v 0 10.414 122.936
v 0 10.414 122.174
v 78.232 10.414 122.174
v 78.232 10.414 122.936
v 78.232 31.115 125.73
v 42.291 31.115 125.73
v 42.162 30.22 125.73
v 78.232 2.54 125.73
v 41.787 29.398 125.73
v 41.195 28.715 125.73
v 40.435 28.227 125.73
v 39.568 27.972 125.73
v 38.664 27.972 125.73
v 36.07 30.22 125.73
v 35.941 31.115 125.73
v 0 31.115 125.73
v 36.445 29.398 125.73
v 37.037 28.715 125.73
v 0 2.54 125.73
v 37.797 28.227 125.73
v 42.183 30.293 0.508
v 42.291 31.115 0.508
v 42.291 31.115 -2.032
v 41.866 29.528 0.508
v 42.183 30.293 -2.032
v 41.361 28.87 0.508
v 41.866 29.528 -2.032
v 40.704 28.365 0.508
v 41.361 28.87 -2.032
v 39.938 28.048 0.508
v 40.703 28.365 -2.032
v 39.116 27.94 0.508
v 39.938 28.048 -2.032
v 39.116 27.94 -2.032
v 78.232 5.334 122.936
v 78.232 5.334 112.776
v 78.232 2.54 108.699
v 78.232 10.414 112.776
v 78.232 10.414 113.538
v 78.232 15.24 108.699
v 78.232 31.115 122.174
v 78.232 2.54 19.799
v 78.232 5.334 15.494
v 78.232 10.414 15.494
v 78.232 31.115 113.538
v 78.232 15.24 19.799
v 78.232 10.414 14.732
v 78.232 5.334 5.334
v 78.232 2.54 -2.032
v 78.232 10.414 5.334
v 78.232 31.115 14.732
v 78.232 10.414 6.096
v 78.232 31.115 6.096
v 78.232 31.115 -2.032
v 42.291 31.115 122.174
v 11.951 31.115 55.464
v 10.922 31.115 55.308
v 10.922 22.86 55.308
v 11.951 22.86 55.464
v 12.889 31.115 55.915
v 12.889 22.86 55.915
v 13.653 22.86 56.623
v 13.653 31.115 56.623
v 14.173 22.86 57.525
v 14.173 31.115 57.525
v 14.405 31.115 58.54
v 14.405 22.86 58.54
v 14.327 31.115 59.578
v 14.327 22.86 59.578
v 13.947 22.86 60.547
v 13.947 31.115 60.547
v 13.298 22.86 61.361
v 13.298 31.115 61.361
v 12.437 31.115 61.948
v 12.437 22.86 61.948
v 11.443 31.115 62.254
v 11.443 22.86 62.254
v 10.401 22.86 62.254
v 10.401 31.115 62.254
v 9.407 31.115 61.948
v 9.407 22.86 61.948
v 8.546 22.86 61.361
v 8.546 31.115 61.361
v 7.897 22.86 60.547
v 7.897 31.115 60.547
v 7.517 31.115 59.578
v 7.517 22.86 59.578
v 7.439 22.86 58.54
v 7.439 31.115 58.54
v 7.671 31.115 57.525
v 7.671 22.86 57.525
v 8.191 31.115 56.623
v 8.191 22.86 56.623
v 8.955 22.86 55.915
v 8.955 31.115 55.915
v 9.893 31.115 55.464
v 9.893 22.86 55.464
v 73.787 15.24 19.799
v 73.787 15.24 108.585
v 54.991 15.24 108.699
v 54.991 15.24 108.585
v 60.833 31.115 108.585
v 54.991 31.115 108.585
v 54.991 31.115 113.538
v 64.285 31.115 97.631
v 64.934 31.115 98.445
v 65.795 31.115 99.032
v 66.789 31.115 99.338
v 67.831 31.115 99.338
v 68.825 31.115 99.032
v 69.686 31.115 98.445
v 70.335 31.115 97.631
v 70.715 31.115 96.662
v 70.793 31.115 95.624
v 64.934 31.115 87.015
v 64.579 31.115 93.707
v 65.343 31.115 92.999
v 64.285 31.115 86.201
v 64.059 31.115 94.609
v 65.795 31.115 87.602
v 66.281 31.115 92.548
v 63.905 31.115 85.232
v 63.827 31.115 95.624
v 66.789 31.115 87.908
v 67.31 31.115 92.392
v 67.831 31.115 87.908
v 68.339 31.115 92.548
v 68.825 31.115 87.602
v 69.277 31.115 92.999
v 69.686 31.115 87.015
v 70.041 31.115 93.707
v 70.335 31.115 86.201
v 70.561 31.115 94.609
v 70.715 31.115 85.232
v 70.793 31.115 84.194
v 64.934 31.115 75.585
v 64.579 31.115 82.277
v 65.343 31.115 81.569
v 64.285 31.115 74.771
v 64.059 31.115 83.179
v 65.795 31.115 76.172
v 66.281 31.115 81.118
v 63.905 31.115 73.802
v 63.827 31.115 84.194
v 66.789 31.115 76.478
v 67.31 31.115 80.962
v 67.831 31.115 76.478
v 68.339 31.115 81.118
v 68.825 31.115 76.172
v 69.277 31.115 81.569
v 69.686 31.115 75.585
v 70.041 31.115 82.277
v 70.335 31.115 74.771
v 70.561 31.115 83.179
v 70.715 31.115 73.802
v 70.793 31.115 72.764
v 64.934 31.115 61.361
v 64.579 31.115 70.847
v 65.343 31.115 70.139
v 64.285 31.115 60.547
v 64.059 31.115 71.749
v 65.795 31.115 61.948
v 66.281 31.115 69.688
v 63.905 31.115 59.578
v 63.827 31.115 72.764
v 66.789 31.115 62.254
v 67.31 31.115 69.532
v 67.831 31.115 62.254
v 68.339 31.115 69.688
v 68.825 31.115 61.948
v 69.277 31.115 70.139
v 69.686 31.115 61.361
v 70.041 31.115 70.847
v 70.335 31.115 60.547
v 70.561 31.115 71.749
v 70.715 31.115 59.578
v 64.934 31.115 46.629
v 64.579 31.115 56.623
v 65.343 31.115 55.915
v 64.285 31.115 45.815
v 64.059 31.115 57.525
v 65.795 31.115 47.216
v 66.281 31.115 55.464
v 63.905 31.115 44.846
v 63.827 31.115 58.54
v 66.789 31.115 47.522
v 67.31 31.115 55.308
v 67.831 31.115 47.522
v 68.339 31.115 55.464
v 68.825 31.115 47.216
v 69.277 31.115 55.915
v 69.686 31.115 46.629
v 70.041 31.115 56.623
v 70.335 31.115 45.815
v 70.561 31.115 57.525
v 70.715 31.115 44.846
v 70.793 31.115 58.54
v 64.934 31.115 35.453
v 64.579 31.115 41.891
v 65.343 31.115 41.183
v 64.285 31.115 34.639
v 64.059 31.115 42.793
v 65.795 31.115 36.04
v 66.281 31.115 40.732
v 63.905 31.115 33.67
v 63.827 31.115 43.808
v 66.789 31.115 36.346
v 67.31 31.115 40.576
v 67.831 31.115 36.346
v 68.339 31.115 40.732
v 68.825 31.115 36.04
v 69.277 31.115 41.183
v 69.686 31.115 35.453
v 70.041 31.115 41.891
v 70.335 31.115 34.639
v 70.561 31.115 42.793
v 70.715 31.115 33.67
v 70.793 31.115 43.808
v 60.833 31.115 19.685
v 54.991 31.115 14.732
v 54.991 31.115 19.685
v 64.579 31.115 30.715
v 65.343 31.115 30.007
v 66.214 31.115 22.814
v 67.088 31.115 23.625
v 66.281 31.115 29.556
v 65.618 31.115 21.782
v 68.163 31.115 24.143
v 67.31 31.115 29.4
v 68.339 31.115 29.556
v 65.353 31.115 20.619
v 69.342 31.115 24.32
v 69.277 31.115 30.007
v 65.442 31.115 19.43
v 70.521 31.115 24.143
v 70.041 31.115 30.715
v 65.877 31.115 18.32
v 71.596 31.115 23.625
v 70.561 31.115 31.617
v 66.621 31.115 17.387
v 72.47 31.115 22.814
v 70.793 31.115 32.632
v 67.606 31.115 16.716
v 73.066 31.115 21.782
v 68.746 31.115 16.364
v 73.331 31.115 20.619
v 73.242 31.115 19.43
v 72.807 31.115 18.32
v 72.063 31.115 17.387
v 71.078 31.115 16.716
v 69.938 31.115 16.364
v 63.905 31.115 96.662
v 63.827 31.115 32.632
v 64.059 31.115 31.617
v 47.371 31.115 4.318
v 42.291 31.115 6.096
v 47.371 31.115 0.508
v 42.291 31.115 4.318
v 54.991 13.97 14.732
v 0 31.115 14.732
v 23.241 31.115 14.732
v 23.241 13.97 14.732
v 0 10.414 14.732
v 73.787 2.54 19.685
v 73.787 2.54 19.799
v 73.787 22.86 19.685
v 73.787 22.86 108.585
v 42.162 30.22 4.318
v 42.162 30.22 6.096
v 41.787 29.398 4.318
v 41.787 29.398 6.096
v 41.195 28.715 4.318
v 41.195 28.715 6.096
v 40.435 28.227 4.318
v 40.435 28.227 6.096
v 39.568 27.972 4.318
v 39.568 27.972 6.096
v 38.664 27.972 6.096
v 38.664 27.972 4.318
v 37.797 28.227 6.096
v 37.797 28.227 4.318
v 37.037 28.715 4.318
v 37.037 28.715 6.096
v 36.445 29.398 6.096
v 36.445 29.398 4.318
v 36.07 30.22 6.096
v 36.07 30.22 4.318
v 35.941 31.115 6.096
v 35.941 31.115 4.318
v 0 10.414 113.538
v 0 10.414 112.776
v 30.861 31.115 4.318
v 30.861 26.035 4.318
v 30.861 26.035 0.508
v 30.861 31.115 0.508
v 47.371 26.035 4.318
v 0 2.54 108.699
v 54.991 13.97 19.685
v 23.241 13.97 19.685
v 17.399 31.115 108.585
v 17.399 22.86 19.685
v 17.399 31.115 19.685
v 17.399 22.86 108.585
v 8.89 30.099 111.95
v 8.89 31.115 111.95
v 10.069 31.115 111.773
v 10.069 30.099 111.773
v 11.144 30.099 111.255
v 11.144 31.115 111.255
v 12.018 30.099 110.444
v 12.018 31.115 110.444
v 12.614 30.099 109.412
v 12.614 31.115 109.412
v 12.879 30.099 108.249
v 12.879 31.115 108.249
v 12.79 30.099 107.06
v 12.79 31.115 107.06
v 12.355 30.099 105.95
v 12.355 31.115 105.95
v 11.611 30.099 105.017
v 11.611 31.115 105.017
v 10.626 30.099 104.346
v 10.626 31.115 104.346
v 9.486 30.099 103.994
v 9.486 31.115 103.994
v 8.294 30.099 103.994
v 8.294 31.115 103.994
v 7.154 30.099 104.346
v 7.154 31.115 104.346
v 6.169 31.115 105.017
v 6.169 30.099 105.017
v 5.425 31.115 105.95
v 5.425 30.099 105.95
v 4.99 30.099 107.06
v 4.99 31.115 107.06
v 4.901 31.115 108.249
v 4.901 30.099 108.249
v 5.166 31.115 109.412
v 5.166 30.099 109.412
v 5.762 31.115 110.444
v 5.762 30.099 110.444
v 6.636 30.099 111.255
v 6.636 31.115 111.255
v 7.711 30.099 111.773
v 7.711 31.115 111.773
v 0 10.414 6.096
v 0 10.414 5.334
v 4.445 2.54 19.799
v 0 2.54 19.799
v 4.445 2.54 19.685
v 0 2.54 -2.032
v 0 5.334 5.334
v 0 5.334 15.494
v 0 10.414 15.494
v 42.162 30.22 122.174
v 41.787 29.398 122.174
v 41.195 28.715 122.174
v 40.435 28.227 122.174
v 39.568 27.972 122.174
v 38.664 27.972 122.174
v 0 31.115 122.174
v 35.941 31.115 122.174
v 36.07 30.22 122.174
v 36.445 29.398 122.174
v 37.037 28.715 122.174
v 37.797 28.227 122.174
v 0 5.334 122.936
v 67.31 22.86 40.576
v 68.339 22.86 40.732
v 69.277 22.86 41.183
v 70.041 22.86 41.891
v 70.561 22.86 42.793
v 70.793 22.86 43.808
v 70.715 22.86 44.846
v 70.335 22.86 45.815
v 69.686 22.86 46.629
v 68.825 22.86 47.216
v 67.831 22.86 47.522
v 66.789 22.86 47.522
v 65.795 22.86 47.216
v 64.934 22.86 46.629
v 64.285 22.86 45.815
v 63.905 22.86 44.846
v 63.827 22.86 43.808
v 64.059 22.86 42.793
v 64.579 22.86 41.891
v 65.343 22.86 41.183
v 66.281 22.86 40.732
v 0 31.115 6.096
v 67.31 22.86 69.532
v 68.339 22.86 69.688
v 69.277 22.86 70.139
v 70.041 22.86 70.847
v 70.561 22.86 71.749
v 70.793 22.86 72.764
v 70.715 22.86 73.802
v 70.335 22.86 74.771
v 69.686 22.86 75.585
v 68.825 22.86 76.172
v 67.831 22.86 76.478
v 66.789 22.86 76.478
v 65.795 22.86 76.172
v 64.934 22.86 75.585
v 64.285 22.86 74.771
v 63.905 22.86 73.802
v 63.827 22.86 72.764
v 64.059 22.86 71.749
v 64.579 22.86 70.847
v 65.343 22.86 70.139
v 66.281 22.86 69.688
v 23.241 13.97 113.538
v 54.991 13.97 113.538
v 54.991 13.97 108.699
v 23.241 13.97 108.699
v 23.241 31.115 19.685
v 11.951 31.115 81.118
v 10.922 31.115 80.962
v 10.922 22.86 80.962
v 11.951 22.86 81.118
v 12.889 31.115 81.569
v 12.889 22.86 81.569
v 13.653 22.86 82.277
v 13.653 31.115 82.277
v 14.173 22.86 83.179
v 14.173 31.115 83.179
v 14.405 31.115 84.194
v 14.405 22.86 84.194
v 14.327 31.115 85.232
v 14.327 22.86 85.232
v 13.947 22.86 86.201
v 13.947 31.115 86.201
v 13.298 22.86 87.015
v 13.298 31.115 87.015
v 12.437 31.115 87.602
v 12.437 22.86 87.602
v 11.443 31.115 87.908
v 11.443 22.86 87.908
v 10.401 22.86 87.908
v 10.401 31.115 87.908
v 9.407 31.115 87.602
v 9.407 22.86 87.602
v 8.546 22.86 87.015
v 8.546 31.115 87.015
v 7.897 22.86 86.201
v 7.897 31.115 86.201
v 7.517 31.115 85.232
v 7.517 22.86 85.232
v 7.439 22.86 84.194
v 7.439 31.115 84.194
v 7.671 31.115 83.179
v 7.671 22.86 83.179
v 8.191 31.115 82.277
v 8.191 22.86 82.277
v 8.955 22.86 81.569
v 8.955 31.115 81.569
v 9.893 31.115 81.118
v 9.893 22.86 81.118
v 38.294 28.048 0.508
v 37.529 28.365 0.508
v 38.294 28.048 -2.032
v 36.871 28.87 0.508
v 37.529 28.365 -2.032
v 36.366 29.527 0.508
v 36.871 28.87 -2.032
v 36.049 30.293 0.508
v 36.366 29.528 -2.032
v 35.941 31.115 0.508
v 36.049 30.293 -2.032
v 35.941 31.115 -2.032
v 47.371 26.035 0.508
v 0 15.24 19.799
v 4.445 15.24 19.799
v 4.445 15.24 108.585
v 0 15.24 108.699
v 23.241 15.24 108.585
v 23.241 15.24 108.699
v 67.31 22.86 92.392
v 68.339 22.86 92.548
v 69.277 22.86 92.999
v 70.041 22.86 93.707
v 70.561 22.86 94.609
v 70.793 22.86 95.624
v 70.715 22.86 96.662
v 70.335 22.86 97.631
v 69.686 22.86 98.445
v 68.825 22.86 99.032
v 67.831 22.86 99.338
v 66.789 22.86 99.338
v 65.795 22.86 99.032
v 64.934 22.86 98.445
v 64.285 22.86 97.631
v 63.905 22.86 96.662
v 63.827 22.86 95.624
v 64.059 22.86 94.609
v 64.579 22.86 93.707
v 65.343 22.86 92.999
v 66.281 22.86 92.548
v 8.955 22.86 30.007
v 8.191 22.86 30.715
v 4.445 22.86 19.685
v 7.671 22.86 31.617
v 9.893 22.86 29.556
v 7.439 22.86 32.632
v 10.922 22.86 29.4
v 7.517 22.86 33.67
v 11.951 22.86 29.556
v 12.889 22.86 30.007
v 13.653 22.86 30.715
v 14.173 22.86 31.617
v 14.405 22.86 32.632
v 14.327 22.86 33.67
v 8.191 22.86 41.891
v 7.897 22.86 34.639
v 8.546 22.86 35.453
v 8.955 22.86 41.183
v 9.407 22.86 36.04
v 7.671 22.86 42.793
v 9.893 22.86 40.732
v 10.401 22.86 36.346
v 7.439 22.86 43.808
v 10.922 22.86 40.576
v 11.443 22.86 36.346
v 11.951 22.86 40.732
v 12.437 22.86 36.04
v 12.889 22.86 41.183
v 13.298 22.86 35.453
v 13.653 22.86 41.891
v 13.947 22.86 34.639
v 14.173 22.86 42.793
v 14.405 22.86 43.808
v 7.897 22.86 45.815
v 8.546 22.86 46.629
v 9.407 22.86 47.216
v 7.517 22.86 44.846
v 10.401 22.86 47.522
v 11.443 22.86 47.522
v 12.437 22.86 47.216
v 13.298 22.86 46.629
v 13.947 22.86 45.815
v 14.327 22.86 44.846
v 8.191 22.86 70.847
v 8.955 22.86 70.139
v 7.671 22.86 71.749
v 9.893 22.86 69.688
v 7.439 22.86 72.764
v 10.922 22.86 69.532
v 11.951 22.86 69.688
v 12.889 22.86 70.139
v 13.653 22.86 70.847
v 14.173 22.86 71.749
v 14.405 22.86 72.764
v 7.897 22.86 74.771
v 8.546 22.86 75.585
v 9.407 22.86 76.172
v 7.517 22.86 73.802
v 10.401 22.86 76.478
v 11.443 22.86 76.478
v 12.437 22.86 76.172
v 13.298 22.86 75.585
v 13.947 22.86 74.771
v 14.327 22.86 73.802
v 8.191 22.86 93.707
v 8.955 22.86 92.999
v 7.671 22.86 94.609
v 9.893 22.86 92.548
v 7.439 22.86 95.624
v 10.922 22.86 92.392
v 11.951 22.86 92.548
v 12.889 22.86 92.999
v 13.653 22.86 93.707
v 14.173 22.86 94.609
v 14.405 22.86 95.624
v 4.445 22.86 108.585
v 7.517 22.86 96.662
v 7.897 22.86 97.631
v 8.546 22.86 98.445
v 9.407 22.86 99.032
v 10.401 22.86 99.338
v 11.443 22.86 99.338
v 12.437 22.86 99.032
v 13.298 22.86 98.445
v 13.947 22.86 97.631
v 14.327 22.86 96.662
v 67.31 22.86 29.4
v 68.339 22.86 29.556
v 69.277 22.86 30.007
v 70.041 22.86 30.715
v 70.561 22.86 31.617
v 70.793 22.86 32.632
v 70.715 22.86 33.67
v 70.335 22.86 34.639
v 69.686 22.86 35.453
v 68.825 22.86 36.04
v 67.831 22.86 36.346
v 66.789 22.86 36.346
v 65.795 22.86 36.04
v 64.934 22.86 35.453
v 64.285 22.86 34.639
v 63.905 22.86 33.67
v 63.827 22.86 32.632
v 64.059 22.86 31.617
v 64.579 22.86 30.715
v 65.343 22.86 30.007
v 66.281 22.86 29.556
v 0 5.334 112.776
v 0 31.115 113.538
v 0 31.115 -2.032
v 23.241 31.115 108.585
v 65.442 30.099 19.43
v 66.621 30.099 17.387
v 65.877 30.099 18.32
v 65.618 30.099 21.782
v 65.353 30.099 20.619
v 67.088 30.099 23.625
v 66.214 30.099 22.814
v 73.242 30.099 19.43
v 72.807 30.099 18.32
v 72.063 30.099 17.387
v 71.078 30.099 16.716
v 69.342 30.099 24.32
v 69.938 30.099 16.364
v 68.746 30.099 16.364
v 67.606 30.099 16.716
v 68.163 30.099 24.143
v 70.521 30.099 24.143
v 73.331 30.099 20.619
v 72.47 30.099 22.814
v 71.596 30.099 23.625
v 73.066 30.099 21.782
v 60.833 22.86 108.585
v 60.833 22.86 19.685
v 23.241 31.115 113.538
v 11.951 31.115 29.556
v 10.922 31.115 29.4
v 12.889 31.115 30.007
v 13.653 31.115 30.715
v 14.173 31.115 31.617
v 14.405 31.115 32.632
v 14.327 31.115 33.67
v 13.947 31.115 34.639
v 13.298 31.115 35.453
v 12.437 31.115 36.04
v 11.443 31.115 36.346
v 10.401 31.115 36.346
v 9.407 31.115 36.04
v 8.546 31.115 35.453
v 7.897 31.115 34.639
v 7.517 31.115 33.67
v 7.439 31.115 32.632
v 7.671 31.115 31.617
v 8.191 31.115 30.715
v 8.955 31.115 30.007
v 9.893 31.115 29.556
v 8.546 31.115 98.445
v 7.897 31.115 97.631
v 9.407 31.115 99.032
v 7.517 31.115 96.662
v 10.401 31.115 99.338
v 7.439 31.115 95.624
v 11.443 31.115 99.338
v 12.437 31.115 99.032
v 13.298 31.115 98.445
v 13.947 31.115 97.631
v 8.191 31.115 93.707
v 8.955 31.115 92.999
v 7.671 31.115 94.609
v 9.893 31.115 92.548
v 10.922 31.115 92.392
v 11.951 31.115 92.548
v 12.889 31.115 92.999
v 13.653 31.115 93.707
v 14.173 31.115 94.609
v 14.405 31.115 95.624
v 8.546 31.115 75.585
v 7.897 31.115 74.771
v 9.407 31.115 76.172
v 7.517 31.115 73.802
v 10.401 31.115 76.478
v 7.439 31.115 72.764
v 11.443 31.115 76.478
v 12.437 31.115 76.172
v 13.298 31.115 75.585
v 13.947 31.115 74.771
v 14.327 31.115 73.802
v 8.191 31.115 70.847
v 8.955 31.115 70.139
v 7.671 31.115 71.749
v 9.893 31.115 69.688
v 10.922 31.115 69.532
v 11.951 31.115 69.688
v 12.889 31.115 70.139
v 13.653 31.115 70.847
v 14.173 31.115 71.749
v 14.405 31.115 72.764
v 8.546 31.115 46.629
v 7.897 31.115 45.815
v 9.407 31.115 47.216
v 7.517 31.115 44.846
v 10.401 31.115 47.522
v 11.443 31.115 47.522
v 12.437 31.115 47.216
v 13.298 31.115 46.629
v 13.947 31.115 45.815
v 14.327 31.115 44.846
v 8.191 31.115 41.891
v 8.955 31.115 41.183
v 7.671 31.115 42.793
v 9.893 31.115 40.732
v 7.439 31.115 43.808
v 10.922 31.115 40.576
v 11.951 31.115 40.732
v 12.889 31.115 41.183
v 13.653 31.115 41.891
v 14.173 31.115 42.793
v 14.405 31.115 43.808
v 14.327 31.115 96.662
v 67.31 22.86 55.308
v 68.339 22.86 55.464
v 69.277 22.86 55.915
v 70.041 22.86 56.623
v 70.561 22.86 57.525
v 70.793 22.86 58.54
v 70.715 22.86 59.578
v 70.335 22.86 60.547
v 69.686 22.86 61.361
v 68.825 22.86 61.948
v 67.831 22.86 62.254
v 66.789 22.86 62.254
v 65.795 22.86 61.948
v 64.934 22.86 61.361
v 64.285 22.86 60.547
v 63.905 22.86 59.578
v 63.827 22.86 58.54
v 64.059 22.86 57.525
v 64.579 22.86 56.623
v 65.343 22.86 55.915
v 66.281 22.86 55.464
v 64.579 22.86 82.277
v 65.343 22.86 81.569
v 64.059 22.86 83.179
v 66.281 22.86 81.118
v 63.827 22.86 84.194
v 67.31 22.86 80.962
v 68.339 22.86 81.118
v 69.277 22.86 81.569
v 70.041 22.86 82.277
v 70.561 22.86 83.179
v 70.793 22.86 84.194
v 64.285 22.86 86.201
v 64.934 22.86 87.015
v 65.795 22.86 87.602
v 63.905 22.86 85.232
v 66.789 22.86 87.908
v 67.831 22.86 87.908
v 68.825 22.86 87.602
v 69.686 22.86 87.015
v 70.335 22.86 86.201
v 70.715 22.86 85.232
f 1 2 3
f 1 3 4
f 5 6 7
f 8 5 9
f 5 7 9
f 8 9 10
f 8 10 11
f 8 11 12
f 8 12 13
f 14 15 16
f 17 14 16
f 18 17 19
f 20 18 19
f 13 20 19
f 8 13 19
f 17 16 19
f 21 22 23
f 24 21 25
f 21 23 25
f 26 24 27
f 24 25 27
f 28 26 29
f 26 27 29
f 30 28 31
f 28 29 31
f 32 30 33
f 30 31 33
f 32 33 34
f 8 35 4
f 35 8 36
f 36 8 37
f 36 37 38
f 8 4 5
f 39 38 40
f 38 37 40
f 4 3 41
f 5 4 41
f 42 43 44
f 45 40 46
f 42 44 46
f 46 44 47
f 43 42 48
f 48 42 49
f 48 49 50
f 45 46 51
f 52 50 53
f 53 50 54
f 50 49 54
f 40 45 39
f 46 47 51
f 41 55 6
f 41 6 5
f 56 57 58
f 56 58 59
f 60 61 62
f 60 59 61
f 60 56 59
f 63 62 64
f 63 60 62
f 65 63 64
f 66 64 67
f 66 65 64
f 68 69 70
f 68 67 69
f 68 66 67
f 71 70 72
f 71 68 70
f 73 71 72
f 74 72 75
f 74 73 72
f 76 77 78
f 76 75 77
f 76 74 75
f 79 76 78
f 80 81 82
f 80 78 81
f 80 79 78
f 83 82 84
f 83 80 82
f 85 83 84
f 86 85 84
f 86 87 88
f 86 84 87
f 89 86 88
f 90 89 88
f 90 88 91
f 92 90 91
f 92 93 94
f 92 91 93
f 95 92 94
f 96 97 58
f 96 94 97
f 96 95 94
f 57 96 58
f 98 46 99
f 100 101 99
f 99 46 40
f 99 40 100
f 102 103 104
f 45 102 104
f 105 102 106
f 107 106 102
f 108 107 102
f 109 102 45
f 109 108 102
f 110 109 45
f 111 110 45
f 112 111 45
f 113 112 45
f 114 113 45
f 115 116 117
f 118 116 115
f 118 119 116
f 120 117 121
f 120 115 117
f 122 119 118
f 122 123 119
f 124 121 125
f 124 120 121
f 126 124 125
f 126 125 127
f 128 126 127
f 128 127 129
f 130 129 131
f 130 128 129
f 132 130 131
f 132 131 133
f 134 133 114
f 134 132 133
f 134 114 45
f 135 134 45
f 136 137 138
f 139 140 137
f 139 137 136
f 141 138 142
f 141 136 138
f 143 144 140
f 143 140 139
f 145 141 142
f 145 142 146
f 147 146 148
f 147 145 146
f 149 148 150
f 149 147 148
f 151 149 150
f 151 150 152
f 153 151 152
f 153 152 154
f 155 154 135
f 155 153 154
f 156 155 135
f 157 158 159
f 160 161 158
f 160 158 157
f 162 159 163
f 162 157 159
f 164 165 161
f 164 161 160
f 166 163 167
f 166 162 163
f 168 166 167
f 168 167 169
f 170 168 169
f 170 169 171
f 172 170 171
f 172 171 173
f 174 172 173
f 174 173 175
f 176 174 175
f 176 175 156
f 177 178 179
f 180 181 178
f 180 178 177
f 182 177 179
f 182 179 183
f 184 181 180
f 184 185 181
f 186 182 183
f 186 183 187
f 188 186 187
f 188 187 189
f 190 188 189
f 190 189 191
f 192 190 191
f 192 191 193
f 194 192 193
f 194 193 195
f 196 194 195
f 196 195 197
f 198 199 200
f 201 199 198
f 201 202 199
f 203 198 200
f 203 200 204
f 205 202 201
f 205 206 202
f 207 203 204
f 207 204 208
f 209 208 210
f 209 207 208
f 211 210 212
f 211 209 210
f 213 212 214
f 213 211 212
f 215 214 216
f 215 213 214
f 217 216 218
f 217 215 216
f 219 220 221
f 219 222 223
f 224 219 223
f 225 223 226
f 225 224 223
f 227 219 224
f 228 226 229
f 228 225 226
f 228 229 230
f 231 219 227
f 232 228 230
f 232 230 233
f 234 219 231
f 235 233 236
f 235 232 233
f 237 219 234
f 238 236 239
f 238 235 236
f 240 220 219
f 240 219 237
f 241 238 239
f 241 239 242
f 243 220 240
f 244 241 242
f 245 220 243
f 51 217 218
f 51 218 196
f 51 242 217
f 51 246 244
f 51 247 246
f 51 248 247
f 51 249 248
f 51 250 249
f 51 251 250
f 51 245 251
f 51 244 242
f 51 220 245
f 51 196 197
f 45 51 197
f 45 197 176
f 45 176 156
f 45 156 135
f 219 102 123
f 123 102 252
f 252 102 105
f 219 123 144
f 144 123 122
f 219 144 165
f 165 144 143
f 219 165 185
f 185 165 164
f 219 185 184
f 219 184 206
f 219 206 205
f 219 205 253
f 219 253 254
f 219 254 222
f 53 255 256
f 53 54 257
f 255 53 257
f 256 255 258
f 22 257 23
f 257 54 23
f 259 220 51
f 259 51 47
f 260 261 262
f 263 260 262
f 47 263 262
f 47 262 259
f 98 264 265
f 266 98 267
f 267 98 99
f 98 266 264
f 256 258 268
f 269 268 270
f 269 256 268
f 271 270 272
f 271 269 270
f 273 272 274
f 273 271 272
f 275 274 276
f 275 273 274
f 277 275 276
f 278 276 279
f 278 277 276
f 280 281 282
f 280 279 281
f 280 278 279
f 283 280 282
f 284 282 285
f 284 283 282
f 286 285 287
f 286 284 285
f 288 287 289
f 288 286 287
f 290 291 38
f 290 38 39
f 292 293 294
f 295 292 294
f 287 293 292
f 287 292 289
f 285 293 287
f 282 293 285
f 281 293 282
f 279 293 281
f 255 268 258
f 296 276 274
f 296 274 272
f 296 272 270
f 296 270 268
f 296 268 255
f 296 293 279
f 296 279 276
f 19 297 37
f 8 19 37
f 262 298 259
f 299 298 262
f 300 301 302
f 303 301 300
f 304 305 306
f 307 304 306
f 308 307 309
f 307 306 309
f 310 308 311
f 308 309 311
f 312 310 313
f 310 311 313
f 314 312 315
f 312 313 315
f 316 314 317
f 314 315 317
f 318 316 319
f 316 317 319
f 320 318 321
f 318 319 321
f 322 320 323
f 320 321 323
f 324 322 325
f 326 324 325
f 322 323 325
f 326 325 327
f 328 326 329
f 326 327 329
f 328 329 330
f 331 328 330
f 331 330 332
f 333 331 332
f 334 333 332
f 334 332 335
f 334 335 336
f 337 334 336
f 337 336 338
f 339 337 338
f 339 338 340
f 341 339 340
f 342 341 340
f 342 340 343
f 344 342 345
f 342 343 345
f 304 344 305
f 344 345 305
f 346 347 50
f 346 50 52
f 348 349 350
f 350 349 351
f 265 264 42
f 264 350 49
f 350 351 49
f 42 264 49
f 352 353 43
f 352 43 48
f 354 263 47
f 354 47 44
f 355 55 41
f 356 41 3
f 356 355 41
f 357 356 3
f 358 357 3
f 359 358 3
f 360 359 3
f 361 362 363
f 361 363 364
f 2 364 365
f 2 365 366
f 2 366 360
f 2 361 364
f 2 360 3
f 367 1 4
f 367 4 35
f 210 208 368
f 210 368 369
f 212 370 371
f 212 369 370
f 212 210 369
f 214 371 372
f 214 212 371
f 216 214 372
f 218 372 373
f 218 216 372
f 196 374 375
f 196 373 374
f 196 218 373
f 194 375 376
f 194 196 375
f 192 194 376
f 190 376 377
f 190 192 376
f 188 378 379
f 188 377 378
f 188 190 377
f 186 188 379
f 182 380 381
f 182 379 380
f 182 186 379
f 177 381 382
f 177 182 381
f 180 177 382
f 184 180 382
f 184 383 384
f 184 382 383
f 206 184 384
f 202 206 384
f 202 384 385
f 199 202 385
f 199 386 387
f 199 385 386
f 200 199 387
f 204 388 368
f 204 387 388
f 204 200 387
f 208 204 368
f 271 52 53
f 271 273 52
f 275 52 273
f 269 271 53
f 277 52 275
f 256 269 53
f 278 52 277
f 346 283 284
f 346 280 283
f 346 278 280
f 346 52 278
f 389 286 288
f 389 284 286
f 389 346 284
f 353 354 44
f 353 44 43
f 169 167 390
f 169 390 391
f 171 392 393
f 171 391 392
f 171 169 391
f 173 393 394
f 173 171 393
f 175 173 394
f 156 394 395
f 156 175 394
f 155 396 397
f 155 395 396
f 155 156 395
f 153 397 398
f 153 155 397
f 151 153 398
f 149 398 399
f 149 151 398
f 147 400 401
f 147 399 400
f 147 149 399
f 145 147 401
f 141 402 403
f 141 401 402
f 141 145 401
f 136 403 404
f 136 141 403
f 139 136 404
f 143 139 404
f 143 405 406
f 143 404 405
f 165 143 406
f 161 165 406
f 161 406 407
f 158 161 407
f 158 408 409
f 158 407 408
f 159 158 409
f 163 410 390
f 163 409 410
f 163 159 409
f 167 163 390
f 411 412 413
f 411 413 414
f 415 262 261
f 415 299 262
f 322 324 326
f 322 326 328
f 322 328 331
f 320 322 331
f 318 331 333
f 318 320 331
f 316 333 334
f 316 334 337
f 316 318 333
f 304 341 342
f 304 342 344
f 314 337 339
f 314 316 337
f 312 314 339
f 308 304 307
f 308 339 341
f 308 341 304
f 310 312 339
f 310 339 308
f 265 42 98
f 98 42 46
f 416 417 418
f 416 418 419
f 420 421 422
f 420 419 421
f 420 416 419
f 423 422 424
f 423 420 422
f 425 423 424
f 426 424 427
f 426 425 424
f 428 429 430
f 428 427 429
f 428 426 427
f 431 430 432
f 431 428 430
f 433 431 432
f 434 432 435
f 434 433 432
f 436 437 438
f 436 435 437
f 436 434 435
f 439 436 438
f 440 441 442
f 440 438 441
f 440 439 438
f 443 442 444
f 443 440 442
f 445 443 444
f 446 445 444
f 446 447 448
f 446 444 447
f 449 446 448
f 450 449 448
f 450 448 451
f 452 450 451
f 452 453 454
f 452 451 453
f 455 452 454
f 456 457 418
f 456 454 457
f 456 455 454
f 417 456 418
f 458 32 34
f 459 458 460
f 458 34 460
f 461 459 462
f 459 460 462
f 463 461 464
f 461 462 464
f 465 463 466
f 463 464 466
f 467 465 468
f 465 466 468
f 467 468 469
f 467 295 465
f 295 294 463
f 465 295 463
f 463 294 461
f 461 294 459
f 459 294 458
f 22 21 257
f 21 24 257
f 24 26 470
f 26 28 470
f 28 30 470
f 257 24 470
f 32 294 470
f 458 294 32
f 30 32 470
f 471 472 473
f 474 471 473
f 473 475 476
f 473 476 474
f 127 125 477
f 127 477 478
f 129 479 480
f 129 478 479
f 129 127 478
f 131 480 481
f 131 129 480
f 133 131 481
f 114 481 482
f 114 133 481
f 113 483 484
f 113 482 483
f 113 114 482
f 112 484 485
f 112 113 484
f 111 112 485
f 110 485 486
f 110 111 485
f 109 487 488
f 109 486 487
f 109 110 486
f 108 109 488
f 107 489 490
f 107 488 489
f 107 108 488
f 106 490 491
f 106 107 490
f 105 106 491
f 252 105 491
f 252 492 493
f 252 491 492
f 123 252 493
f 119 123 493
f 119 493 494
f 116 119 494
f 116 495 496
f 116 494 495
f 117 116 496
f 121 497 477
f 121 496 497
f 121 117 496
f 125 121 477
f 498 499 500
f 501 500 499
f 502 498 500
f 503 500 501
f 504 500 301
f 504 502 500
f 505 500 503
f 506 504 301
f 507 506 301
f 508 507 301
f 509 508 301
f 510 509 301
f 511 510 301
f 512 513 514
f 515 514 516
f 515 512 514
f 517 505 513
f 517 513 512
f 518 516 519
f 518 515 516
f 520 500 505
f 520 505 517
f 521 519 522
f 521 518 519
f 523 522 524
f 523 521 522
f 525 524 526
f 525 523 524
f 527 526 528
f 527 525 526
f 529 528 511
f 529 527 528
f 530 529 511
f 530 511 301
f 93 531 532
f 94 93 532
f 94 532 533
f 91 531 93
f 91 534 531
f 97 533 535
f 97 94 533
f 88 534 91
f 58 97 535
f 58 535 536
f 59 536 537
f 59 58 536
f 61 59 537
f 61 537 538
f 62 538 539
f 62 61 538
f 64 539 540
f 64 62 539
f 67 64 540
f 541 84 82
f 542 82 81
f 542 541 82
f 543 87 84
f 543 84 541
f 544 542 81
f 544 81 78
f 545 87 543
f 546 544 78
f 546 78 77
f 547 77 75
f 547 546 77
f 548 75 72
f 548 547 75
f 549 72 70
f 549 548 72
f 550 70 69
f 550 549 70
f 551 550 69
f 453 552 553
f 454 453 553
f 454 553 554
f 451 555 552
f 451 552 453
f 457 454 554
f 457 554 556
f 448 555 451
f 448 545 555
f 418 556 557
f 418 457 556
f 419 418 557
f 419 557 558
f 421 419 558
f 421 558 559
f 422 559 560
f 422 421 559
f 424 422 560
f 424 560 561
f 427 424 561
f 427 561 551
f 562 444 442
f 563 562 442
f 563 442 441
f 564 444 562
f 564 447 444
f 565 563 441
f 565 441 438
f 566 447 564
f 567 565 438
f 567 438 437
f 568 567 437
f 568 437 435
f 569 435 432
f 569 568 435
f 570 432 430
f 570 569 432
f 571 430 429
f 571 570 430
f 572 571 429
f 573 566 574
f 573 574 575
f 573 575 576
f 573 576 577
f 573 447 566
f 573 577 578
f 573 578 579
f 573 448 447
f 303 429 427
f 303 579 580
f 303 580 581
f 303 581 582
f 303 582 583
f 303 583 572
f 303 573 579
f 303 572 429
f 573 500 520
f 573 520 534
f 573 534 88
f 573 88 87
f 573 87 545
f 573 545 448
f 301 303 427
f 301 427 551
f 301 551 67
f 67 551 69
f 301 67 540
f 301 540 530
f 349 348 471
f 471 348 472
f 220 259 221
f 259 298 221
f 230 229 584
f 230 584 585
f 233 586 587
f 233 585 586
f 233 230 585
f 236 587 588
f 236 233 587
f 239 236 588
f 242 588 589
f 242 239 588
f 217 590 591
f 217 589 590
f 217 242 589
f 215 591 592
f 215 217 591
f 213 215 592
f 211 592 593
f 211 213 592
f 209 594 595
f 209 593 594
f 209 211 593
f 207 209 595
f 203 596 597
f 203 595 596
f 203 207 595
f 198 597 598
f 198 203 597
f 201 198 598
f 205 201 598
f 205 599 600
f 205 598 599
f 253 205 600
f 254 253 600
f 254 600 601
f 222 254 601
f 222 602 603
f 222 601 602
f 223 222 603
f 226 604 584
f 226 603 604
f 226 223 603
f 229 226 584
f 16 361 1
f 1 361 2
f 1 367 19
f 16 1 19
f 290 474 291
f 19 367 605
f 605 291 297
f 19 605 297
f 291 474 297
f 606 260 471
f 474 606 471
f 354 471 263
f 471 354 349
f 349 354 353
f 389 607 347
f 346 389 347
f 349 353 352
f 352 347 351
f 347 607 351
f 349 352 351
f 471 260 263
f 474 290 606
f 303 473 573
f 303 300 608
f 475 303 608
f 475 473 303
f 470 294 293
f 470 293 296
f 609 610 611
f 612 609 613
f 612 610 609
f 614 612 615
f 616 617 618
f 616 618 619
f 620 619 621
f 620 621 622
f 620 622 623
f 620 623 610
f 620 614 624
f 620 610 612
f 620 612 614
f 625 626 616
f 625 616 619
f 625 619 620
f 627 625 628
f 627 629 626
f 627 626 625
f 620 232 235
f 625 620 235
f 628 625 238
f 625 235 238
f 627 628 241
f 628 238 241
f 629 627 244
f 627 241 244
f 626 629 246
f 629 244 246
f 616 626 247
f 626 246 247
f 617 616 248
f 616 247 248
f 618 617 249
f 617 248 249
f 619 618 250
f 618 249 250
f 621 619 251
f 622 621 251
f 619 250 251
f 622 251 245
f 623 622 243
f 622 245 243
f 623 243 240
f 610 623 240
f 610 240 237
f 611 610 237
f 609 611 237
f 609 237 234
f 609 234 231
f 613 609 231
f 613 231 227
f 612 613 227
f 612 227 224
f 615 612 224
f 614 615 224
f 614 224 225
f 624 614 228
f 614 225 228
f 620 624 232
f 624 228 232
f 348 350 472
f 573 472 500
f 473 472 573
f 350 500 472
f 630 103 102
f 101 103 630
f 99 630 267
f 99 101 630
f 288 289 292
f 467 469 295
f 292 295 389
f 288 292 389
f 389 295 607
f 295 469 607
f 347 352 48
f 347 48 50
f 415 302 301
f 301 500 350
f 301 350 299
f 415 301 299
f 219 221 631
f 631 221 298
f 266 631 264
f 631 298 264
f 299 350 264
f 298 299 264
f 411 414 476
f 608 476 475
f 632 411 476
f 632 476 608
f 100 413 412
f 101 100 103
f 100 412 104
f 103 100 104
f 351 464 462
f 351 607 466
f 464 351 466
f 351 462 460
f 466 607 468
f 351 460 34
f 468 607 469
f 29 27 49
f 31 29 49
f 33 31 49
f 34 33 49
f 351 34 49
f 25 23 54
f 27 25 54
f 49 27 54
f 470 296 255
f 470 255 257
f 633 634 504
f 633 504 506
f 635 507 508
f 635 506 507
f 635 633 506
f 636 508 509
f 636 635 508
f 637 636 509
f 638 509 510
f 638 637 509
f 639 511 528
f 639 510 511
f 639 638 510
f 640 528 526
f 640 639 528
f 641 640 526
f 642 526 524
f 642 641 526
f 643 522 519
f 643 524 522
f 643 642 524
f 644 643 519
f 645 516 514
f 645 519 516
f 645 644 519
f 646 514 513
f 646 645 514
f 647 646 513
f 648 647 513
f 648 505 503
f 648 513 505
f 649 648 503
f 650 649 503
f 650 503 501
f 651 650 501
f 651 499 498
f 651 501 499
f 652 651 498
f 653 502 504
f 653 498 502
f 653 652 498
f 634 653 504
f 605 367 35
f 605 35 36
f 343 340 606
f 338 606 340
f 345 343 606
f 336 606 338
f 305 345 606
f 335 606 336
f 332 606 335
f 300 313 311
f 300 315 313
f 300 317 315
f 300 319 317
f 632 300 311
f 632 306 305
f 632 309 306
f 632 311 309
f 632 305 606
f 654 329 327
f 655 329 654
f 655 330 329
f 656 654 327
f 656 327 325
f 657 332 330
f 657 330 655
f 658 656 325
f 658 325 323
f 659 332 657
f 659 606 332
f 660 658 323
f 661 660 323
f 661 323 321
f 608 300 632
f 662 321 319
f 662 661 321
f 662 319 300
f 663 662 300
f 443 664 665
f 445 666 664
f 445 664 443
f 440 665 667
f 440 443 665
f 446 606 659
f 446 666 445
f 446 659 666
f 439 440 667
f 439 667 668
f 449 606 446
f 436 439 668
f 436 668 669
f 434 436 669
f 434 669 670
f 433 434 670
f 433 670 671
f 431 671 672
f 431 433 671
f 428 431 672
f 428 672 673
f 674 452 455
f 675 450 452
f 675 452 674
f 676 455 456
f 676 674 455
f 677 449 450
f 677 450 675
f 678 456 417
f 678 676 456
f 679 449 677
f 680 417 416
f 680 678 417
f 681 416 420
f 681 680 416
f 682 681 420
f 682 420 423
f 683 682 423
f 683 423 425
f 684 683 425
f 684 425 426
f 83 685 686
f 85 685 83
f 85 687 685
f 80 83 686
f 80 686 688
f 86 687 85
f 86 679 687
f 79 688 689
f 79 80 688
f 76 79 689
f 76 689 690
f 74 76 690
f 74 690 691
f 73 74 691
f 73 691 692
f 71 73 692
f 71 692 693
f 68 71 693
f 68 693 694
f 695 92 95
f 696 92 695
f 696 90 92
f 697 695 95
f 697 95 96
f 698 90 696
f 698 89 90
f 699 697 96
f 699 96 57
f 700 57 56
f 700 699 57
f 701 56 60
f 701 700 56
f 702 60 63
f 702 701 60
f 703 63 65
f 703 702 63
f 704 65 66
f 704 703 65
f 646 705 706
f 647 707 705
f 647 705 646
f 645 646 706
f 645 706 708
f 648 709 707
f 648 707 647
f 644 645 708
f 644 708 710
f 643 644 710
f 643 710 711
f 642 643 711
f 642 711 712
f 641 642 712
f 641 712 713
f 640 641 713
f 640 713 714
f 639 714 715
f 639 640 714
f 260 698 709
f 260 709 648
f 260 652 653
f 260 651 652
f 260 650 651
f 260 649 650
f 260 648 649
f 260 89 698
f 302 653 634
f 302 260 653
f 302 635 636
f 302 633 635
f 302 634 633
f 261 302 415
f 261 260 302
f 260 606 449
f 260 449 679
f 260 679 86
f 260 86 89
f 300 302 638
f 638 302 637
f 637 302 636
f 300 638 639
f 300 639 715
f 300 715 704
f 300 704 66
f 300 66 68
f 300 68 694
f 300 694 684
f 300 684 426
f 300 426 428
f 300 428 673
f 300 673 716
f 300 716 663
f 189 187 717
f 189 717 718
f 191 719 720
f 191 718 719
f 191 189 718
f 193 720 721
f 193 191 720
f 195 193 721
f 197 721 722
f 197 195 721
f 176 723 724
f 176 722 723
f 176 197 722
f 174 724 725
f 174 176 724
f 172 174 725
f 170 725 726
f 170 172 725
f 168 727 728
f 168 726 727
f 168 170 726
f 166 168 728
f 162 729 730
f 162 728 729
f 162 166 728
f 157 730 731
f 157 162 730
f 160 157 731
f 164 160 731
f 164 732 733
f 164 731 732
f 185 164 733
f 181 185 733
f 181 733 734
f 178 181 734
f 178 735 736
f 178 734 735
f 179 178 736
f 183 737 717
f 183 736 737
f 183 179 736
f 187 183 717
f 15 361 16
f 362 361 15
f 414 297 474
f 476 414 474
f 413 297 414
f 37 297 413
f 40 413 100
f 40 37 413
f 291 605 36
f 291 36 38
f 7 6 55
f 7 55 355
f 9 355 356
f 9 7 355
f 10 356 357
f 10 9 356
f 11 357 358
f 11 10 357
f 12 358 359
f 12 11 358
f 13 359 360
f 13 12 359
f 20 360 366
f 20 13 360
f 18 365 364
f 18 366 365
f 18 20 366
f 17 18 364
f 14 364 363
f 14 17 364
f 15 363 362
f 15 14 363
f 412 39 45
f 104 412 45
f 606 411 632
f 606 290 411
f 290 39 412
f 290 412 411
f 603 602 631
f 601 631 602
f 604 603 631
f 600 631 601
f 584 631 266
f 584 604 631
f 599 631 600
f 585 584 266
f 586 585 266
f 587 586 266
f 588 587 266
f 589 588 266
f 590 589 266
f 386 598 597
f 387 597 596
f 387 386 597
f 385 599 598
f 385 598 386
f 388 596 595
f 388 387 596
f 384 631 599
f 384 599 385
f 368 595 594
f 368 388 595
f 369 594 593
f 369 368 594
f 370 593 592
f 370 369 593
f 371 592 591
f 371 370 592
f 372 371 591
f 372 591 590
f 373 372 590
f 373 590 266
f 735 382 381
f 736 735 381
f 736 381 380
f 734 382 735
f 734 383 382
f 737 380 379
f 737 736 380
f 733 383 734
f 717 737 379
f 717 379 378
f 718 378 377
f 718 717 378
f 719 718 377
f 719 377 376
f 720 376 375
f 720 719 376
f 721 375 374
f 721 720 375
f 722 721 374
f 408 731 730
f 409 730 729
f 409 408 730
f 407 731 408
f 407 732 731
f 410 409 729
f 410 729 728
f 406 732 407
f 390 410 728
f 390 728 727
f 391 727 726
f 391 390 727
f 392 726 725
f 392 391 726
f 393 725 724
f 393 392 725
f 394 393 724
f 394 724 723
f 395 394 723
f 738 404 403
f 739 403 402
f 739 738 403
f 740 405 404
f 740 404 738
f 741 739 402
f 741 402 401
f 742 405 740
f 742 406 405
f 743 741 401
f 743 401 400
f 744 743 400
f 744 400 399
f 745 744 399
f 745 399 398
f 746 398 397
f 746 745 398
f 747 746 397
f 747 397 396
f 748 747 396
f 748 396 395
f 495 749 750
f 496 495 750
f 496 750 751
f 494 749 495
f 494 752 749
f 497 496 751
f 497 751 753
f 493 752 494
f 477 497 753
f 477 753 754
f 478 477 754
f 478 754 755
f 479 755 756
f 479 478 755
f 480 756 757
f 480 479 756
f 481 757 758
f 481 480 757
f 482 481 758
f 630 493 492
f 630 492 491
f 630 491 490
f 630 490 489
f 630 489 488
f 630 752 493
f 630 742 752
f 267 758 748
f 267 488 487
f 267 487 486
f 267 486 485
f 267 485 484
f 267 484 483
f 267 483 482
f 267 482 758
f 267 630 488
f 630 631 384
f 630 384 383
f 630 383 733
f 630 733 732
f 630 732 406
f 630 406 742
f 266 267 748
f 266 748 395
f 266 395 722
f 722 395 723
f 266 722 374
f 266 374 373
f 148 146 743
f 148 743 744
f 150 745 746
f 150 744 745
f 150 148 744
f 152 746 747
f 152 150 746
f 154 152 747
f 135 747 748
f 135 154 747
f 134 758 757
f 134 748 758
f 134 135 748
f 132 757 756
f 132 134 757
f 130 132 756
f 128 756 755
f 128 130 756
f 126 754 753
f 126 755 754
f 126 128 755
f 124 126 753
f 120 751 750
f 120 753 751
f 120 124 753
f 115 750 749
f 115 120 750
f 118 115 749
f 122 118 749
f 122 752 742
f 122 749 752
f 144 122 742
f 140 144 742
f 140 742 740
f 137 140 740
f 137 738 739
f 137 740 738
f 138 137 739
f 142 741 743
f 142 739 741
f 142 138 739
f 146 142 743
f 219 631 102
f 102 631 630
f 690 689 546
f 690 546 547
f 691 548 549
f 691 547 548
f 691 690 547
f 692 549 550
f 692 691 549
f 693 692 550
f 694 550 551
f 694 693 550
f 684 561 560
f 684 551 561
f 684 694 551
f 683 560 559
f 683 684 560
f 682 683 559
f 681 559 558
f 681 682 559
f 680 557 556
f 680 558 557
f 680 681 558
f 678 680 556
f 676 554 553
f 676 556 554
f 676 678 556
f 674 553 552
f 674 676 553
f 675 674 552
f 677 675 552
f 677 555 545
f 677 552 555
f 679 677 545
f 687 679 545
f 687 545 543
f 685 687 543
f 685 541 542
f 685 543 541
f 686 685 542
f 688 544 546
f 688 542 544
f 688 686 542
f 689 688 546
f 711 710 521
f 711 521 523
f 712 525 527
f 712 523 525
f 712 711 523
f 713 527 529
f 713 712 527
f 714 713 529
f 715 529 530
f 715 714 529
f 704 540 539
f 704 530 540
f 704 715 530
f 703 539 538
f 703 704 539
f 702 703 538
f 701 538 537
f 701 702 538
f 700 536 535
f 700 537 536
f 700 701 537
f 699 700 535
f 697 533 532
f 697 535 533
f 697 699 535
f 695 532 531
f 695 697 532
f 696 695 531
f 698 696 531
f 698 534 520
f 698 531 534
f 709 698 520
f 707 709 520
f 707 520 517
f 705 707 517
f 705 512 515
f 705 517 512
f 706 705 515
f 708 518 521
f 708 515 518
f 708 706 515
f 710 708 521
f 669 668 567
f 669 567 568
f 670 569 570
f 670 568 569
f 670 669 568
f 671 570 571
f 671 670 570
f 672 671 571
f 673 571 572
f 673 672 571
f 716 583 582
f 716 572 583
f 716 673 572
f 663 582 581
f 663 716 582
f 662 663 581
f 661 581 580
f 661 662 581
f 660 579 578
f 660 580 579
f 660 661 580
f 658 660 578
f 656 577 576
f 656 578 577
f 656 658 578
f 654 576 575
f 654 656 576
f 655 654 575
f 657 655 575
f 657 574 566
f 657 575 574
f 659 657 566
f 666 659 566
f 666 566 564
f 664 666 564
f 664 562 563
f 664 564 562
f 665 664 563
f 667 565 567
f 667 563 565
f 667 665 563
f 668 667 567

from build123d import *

# Parameters (mm, degrees)
SKETCH1_W                = 78.232
SKETCH1_H                = 62.23
BOSS_EXTRUDE1_DEPTH      = 128.27
SKETCH2_W                = 43.434
SKETCH2_H                = 88.9
CUT_EXTRUDE1_DEPTH       = 44.45
SKETCH3_W                = 69.342
SKETCH3_H                = 88.9
CUT_EXTRUDE2_DEPTH       = 22.86
CUT_EXTRUDE3_DEPTH       = 163.622297438
CUT_EXTRUDE3_DEPTH_BACK  = 163.622297438
SKETCH4_R                = 3.175
CUT_EXTRUDE4_DEPTH       = 156.317209684
CUT_EXTRUDE4_DEPTH_BACK  = 156.317209684
SKETCH6_R                = 3.4925
CUT_EXTRUDE6_DEPTH       = 163.622297438
CUT_EXTRUDE6_DEPTH_BACK  = 163.622297438
CUT_EXTRUDE7_DEPTH       = 163.622297438
CUT_EXTRUDE7_DEPTH_BACK  = 163.622297438
CUT_EXTRUDE8_DEPTH       = 159.64613082
CUT_EXTRUDE8_DEPTH_BACK  = 107.95
SKETCH9_W                = 44.45
SKETCH9_H                = 5.08
SKETCH10_W               = 38.1
SKETCH10_H               = 80.01
CUT_EXTRUDE9_DEPTH       = 19.05
CUT_EXTRUDE10_START      = -6.35
SKETCH11_W               = 31.75
SKETCH11_H               = 34.29
CUT_EXTRUDE10_DEPTH      = 101.6
CUT_EXTRUDE11_DEPTH      = 159.64613082
CUT_EXTRUDE11_DEPTH_BACK = 159.64613082
SKETCH12_W               = 78.232
SKETCH12_H               = 31.115
BOSS_EXTRUDE4_START      = 4.572
BOSS_EXTRUDE4_DEPTH      = 4.572
CUT_EXTRUDE12_DEPTH      = 151.813823468
CUT_EXTRUDE12_DEPTH_BACK = 5.08
SKETCH18_W               = 16.51
SKETCH18_H               = 3.81
CUT_EXTRUDE13_DEPTH      = 150.066084318
CUT_EXTRUDE13_DEPTH_BACK = 150.066084318
SKETCH19_W               = 88.9
SKETCH19_H               = 12.7
SKETCH13_R               = 4.0005
CUT_EXTRUDE14_DEPTH      = 1.016
MOVE_FACE1_BY            = 0.762
MOVE_FACE1_2_BY          = 0.762
MOVE_FACE1_3_BY          = 0.762
MOVE_FACE1_4_BY          = 0.762


with BuildPart() as part:
    # Sketch1 → Boss-Extrude1 (new body)
    with BuildSketch(Plane.XY):
        with Locations((39.116, 31.115)):
            Rectangle(SKETCH1_W, SKETCH1_H)
    extrude(amount=BOSS_EXTRUDE1_DEPTH)

    # Sketch2 → Cut-Extrude1 (cut)
    with BuildSketch(Plane.XZ):
        with Locations((39.116, 64.135)):
            Rectangle(SKETCH2_W, SKETCH2_H)
    extrude(amount=-CUT_EXTRUDE1_DEPTH, mode=Mode.SUBTRACT)

    # Sketch3 → Cut-Extrude2 (cut)
    with BuildSketch(Plane.XZ):
        with Locations((39.116, 64.135)):
            Rectangle(SKETCH3_W, SKETCH3_H)
    extrude(amount=-CUT_EXTRUDE2_DEPTH, mode=Mode.SUBTRACT)

    # Sketch4 → Cut-Extrude3 (cut, two sides: drawn at the far end of the back side and taken through both)
    with BuildSketch(Plane(origin=(0, 0, 0), x_dir=(-1, 0, 0), z_dir=(0, 0, -1)).offset(-CUT_EXTRUDE3_DEPTH_BACK)):
        with Locations((-39.116, 31.115)):
            Circle(SKETCH4_R)
    extrude(amount=CUT_EXTRUDE3_DEPTH + CUT_EXTRUDE3_DEPTH_BACK, mode=Mode.SUBTRACT)

    # Sketch6 → Cut-Extrude4 (cut, two sides: drawn at the far end of the back side and taken through both)
    with BuildSketch(Plane.XZ.offset(-22.86).offset(-CUT_EXTRUDE4_DEPTH_BACK)):
        with Locations(Location((10.922, 32.893, 0), (0, 0, 270))):
            Circle(SKETCH6_R)
        with Locations(Location((10.922, 44.069, 0), (0, 0, 270))):
            Circle(SKETCH6_R)
        with Locations(Location((10.922, 58.801, 0), (0, 0, 270))):
            Circle(SKETCH6_R)
        with Locations(Location((10.922, 73.025, 0), (0, 0, 270))):
            Circle(SKETCH6_R)
        with Locations(Location((10.922, 84.455, 0), (0, 0, 270))):
            Circle(SKETCH6_R)
        with Locations(Location((10.922, 95.885, 0), (0, 0, 270))):
            Circle(SKETCH6_R)
        with Locations(Location((67.31, 95.885, 0), (0, 0, 270))):
            Circle(SKETCH6_R)
        with Locations(Location((67.31, 84.455, 0), (0, 0, 270))):
            Circle(SKETCH6_R)
        with Locations(Location((67.31, 73.025, 0), (0, 0, 270))):
            Circle(SKETCH6_R)
        with Locations(Location((67.31, 58.801, 0), (0, 0, 270))):
            Circle(SKETCH6_R)
        with Locations(Location((67.31, 44.069, 0), (0, 0, 270))):
            Circle(SKETCH6_R)
        with Locations(Location((67.31, 32.893, 0), (0, 0, 270))):
            Circle(SKETCH6_R)
    extrude(amount=CUT_EXTRUDE4_DEPTH + CUT_EXTRUDE4_DEPTH_BACK, mode=Mode.SUBTRACT)

    # Sketch7 → Cut-Extrude6 (cut, two sides: drawn at the far end of the back side and taken through both)
    with BuildSketch(Plane(origin=(78.232, 0, 0), x_dir=(0, 0, -1), z_dir=(1, 0, 0)).offset(-CUT_EXTRUDE6_DEPTH_BACK)):
        Polygon((-122.936, 58.42), (-122.936, 53.34), (-121.412, 53.34), (-121.412, 10.414), (-122.936, 10.414), (-122.936, 5.334), (-112.776, 5.334), (-112.776, 10.414), (-114.3, 10.414), (-114.3, 53.34), (-112.776, 53.34), (-112.776, 58.42), align=None)
        Polygon((-15.494, 58.42), (-15.494, 53.34), (-13.97, 53.34), (-13.97, 10.414), (-15.494, 10.414), (-15.494, 5.334), (-5.334, 5.334), (-5.334, 10.414), (-6.858, 10.414), (-6.858, 53.34), (-5.334, 53.34), (-5.334, 58.42), align=None)
    extrude(amount=CUT_EXTRUDE6_DEPTH + CUT_EXTRUDE6_DEPTH_BACK, mode=Mode.SUBTRACT)

    # Sketch8 → Cut-Extrude7 (cut, two sides: drawn at the far end of the back side and taken through both)
    with BuildSketch(Plane(origin=(78.232, 0, 0), x_dir=(0, 0, -1), z_dir=(1, 0, 0)).offset(-CUT_EXTRUDE7_DEPTH_BACK)):
        Polygon((-128.27, 62.23), (-125.73, 62.23), (-125.73, 2.54), (-2.54, 2.54), (-2.54, 62.23), (0, 62.23), (0, 0), (-128.27, 0), align=None)
    extrude(amount=CUT_EXTRUDE7_DEPTH + CUT_EXTRUDE7_DEPTH_BACK, mode=Mode.SUBTRACT)

    # Sketch9 → Cut-Extrude8 (cut, two sides: drawn at the far end of the back side and taken through both)
    with BuildSketch(Plane(origin=(0, 0, 2.54), x_dir=(-1, 0, 0), z_dir=(0, 0, -1)).offset(-CUT_EXTRUDE8_DEPTH_BACK)):
        with Locations((-39.116, 57.15)):
            Rectangle(SKETCH9_W, SKETCH9_H)
    extrude(amount=CUT_EXTRUDE8_DEPTH + CUT_EXTRUDE8_DEPTH_BACK, mode=Mode.SUBTRACT)

    # Sketch10 → Cut-Extrude9 (cut)
    with BuildSketch(Plane(origin=(0, 62.23, 0), x_dir=(1, 0, 0), z_dir=(0, 1, 0))):
        with Locations((39.243, -64.135)):
            Rectangle(SKETCH10_W, SKETCH10_H)
    extrude(amount=-CUT_EXTRUDE9_DEPTH, mode=Mode.SUBTRACT)

    # Sketch11 → Cut-Extrude10 (cut)
    with BuildSketch(Plane(origin=(0, 0, 108.585), x_dir=(-1, 0, 0), z_dir=(0, 0, -1)).offset(CUT_EXTRUDE10_START)):
        with Locations((-39.116, 31.115)):
            Rectangle(SKETCH11_W, SKETCH11_H)
    extrude(amount=CUT_EXTRUDE10_DEPTH, mode=Mode.SUBTRACT)

    # Sketch12 → Cut-Extrude11 (cut, two sides: drawn at the far end of the back side and taken through both)
    with BuildSketch(Plane.XY.offset(125.73).offset(-CUT_EXTRUDE11_DEPTH_BACK)):
        with Locations((39.116, 46.6725)):
            Rectangle(SKETCH12_W, SKETCH12_H)
    extrude(amount=CUT_EXTRUDE11_DEPTH + CUT_EXTRUDE11_DEPTH_BACK, mode=Mode.SUBTRACT)

    # Sketch17 → Boss-Extrude4 (add)
    with BuildSketch(Plane(origin=(0, 0, 2.54), x_dir=(-1, 0, 0), z_dir=(0, 0, -1)).offset(BOSS_EXTRUDE4_START)):
        with BuildLine():
            Line((-78.232, 31.115), (-42.291, 31.115))
            ThreePointArc((-42.291, 31.115), (-41.36106403, 28.86993597), (-39.116, 27.94))
            ThreePointArc((-39.116, 27.94), (-36.87093597, 28.86993597), (-35.941, 31.115))
            Line((-35.941, 31.115), (0, 31.115))
            Line((0, 31.115), (0, 2.54))
            Line((0, 2.54), (-78.232, 2.54))
            Line((-78.232, 2.54), (-78.232, 31.115))
        make_face()
    extrude(amount=-BOSS_EXTRUDE4_DEPTH)

    # Sketch18 → Cut-Extrude12 (cut, two sides: drawn at the far end of the back side and taken through both)
    with BuildSketch(Plane(origin=(0, 31.115, 0), x_dir=(1, 0, 0), z_dir=(0, 1, 0)).offset(-CUT_EXTRUDE12_DEPTH_BACK)):
        with Locations((39.116, -2.413)):
            Rectangle(SKETCH18_W, SKETCH18_H)
    extrude(amount=CUT_EXTRUDE12_DEPTH + CUT_EXTRUDE12_DEPTH_BACK, mode=Mode.SUBTRACT)

    # Sketch19 → Cut-Extrude13 (cut, two sides: drawn at the far end of the back side and taken through both)
    with BuildSketch(Plane.ZY.offset(-73.787).offset(-CUT_EXTRUDE13_DEPTH_BACK)):
        with Locations((64.248626707, 8.89)):
            Rectangle(SKETCH19_W, SKETCH19_H)
    extrude(amount=CUT_EXTRUDE13_DEPTH + CUT_EXTRUDE13_DEPTH_BACK, mode=Mode.SUBTRACT)

    # Sketch13 → Cut-Extrude14 (cut)
    with BuildSketch(Plane(origin=(0, 31.115, 0), x_dir=(1, 0, 0), z_dir=(0, 1, 0))):
        with Locations(Location((69.342, -20.32, 0), (0, 0, 270))):
            Circle(SKETCH13_R)
        with Locations(Location((8.89, -107.95, 0), (0, 0, 270))):
            Circle(SKETCH13_R)
    extrude(amount=-CUT_EXTRUDE14_DEPTH, mode=Mode.SUBTRACT)

    # Move Face1: a face moved inward by 0.762
    extrude(part.faces().sort_by_distance((39.116, 20.675603328, 6.858))[0], amount=MOVE_FACE1_BY, dir=(0, 0, -1), mode=Mode.SUBTRACT)

    # Move Face1 2: a face moved inward by 0.762
    extrude(part.faces().sort_by_distance((58.674, 20.7645, 13.97))[0], amount=MOVE_FACE1_2_BY, dir=(0, 0, 1), mode=Mode.SUBTRACT)

    # Move Face1 3: a face moved inward by 0.762
    extrude(part.faces().sort_by_distance((58.674, 20.7645, 114.3))[0], amount=MOVE_FACE1_3_BY, dir=(0, 0, -1), mode=Mode.SUBTRACT)

    # Move Face1 4: a face moved inward by 0.762
    extrude(part.faces().sort_by_distance((39.116, 20.675603328, 121.412))[0], amount=MOVE_FACE1_4_BY, dir=(0, 0, 1), mode=Mode.SUBTRACT)


solid = part.part
